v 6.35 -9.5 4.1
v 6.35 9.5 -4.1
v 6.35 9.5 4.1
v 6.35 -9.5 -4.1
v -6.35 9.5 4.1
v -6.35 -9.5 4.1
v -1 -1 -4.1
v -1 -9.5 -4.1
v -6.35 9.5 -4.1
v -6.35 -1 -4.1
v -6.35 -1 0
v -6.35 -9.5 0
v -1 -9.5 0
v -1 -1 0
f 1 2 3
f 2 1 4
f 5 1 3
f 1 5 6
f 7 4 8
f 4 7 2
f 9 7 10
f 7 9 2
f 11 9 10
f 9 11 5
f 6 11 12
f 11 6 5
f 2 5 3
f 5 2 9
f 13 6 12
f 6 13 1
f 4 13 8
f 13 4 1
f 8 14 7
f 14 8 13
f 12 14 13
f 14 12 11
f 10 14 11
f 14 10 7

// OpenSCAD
module segment() {
    difference() {
        cube([12.7, 19, 8.2], center = true);
        translate([-6.35, -9.5, -4.1])
            cube([10.7, 17, 8.2], center = true);
    }
}

translate([0, 0, 0])
    segment();
